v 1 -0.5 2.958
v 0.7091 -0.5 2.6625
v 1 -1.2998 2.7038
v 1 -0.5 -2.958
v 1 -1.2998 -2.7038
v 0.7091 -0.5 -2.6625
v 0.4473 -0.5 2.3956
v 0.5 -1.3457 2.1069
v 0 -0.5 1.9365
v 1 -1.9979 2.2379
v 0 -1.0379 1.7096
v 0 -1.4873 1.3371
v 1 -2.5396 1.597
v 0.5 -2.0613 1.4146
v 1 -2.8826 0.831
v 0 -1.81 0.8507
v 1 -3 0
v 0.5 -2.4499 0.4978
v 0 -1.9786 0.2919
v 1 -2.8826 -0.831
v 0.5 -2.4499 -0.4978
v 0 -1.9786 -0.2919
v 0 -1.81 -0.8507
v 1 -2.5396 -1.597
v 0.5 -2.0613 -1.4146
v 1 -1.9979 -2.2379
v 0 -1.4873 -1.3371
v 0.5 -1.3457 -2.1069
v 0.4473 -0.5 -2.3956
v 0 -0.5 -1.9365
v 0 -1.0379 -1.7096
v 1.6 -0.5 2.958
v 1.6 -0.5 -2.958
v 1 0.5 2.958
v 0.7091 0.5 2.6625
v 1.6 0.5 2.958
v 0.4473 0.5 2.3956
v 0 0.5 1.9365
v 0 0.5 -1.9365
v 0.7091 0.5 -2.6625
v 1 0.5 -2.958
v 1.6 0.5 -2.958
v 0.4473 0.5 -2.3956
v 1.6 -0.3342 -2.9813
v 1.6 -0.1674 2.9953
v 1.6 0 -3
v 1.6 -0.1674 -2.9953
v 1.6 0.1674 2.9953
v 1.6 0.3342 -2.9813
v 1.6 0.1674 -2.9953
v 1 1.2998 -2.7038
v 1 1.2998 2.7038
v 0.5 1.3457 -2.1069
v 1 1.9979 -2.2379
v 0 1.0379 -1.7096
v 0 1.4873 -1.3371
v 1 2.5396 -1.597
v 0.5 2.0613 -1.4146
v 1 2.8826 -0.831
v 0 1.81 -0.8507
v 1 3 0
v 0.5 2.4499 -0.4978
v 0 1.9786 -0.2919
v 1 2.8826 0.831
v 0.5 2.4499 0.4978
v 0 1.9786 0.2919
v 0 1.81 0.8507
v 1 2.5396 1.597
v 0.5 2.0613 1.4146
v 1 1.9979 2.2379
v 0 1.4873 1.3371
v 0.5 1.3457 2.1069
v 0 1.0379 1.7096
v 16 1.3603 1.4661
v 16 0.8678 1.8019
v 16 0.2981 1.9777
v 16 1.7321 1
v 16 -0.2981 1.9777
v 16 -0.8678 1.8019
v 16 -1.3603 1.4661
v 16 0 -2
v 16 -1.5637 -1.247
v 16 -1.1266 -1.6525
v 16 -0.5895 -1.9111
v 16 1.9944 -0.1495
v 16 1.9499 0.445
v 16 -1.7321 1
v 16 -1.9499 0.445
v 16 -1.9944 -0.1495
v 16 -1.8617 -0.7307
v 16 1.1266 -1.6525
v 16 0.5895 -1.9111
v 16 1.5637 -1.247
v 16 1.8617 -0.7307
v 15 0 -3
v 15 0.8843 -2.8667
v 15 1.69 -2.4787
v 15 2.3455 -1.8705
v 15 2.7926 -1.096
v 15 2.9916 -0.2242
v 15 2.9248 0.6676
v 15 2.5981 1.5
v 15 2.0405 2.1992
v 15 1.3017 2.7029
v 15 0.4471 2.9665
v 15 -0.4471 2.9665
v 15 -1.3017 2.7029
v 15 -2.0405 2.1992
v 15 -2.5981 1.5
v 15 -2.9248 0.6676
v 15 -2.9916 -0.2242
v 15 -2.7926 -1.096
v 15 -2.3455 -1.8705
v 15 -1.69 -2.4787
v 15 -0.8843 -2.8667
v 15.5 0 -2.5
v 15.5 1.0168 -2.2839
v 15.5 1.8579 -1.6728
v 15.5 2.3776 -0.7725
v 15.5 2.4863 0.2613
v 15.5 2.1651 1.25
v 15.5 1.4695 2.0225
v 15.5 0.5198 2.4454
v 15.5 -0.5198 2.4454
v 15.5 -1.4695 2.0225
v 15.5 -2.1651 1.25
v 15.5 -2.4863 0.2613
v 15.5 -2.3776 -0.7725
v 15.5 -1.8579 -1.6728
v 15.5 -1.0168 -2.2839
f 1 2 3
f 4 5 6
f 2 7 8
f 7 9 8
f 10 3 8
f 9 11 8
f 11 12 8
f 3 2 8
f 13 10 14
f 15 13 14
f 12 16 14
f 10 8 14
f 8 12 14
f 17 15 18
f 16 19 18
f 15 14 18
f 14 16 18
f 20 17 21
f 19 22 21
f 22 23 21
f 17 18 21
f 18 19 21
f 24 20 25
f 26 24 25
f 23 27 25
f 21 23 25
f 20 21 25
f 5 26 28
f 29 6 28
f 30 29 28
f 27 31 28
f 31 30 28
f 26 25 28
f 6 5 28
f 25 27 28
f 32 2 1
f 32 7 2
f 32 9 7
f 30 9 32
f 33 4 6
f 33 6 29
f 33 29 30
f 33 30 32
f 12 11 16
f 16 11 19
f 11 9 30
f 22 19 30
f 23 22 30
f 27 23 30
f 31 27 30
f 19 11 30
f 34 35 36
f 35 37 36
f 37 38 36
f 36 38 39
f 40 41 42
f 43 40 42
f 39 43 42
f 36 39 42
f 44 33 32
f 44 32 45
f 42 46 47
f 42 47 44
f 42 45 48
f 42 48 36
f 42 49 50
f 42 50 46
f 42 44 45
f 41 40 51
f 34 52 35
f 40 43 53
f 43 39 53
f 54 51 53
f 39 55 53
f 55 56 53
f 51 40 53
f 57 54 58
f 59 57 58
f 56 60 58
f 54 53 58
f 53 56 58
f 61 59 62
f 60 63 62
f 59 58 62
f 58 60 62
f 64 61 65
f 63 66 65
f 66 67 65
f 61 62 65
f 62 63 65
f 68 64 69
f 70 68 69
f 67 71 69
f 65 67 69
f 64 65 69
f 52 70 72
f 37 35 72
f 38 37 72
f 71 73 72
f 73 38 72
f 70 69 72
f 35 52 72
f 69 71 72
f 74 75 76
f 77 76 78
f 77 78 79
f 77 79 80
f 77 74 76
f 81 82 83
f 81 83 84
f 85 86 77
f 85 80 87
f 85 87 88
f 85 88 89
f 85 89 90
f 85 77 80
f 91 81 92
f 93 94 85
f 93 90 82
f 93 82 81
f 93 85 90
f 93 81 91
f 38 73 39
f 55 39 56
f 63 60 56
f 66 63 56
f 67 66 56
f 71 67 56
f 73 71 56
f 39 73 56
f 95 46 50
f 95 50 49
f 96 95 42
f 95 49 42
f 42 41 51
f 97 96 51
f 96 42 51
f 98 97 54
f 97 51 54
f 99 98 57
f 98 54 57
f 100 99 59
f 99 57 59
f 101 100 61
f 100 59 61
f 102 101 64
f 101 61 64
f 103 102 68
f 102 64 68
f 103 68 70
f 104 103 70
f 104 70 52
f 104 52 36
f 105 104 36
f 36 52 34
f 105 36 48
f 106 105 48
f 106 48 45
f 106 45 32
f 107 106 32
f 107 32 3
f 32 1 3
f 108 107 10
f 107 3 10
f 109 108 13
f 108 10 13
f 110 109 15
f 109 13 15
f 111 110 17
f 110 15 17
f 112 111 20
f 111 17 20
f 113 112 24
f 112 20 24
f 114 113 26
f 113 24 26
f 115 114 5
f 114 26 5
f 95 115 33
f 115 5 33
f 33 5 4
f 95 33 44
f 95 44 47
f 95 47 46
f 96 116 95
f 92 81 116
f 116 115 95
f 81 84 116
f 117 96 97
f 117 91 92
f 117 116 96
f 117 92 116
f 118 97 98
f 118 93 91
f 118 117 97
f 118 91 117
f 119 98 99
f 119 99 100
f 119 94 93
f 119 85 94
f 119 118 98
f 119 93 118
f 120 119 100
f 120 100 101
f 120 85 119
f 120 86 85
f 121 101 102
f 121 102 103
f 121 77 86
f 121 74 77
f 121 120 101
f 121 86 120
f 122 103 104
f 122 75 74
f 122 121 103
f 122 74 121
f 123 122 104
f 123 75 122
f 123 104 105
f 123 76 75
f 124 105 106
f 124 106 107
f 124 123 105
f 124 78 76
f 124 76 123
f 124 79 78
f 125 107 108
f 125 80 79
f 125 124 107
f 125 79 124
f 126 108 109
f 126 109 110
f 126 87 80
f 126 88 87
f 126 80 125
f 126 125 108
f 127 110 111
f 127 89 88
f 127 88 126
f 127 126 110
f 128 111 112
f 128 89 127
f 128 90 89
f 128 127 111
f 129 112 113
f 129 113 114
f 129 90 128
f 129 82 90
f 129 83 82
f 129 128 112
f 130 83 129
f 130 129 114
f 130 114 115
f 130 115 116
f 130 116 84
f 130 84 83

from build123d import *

# Parameters (mm, degrees)
SKETCH_1_R               = 3
EXTRUDE_1_DEPTH          = 16
CUT_EXTRUDE_1_DEPTH      = 17.552945357
CUT_EXTRUDE_1_DEPTH_BACK = 17.552945357
SKETCH_2_W               = 1.6
SKETCH_2_H               = 1
CHAMFER_1_SIZE           = 1


with BuildPart() as part:
    # Эскиз1 → Бобышка-Вытянуть1 (new body)
    with BuildSketch(Plane(origin=(0, 0, 0), x_dir=(0, 0, -1), z_dir=(1, 0, 0))):
        Circle(SKETCH_1_R)
    extrude(amount=EXTRUDE_1_DEPTH)

    # Эскиз2 → Вырез-Вытянуть1 (cut, two sides: drawn at the far end of the back side and taken through both)
    with BuildSketch(Plane.XY.offset(-CUT_EXTRUDE_1_DEPTH_BACK)):
        with Locations((0.8, 0)):
            Rectangle(SKETCH_2_W, SKETCH_2_H)
    extrude(amount=CUT_EXTRUDE_1_DEPTH + CUT_EXTRUDE_1_DEPTH_BACK, mode=Mode.SUBTRACT)

    # Фаска1
    chamfer_1_edges = [part.edges().sort_by_distance(p)[0] for p in [
        (16, 0, 3),
        (0, 3, 0),
        (0, -3, 0),
    ]]
    chamfer(chamfer_1_edges, length=CHAMFER_1_SIZE)


solid = part.part
